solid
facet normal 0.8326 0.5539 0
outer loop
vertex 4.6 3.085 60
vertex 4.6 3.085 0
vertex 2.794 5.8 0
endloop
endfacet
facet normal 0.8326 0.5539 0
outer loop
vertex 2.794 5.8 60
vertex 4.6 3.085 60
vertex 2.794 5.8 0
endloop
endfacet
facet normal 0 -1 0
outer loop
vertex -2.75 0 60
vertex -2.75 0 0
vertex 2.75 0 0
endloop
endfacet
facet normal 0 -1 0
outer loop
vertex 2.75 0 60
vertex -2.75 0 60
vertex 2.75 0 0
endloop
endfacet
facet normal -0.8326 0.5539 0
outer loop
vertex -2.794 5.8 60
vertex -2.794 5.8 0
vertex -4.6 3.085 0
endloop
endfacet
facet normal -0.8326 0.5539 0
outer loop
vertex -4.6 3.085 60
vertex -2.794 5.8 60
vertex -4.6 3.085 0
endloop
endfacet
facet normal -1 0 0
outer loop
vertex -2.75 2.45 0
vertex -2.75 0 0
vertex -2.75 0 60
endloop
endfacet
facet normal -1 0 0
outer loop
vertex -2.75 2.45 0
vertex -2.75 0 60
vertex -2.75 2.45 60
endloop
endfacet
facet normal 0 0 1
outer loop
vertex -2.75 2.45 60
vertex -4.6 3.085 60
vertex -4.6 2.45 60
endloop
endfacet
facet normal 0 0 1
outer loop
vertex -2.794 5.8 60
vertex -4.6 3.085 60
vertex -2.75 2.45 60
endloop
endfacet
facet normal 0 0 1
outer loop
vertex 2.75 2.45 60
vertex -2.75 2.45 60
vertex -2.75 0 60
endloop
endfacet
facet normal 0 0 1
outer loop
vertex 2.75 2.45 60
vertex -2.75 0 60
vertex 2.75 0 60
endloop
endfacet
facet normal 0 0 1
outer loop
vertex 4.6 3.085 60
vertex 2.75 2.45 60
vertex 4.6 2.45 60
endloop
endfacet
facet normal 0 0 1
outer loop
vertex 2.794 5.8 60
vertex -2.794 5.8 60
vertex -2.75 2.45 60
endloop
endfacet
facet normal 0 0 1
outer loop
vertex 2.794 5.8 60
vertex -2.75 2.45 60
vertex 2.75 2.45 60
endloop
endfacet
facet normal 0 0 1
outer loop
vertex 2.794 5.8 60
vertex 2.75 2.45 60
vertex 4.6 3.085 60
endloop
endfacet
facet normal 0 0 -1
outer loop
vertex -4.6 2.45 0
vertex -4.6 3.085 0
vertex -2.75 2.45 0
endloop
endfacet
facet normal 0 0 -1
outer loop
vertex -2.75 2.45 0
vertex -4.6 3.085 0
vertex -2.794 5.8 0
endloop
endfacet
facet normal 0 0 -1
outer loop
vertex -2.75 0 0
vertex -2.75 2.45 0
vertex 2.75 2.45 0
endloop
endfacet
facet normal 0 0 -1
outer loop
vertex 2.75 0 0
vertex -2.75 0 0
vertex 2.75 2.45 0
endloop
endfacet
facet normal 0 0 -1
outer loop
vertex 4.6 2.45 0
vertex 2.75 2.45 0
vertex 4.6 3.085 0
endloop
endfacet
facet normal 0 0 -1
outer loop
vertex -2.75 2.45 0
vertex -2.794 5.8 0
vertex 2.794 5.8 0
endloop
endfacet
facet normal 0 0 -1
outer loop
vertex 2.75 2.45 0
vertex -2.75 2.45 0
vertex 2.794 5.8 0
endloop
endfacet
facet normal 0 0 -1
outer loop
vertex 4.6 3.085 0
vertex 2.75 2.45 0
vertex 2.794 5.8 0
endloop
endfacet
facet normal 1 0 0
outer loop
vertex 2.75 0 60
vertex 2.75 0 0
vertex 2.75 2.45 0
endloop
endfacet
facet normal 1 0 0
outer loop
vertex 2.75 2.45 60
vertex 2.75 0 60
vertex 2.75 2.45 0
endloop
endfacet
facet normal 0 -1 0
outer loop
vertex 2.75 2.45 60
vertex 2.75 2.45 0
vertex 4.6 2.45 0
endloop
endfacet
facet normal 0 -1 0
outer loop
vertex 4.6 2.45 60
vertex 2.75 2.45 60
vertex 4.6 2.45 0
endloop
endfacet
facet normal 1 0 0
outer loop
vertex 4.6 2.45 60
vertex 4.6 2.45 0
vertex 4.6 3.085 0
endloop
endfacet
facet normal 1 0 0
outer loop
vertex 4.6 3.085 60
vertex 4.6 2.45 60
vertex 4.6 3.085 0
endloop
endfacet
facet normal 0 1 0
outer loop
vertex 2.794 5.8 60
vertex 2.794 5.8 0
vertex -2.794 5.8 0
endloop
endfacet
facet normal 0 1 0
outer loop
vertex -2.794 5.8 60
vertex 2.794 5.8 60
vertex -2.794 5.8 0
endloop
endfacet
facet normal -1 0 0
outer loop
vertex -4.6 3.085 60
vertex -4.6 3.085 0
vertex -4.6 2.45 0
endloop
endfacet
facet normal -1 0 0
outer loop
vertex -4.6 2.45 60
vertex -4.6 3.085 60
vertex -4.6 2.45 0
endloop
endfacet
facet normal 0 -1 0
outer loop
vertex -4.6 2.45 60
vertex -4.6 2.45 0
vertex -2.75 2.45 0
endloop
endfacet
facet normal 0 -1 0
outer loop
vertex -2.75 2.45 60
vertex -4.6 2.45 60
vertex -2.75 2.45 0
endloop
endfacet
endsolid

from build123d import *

# Parameters (mm, degrees)
SKETCH1_W           = 5.5
SKETCH1_H           = 2.45
BOSS_EXTRUDE1_DEPTH = 60
BOSS_EXTRUDE2_DEPTH = 60


with BuildPart() as part:
    # Sketch1 → Boss-Extrude1 (new body)
    with BuildSketch(Plane.XY):
        with Locations((0, 1.225)):
            Rectangle(SKETCH1_W, SKETCH1_H)
    extrude(amount=BOSS_EXTRUDE1_DEPTH)

    # Sketch2 → Boss-Extrude2 (add)
    with BuildSketch(Plane.XY):
        Polygon((-4.6, 2.45), (4.6, 2.45), (4.6, 3.085), (2.794, 5.8), (-2.794, 5.8), (-4.6, 3.085), align=None)
    extrude(amount=BOSS_EXTRUDE2_DEPTH)


solid = part.part
